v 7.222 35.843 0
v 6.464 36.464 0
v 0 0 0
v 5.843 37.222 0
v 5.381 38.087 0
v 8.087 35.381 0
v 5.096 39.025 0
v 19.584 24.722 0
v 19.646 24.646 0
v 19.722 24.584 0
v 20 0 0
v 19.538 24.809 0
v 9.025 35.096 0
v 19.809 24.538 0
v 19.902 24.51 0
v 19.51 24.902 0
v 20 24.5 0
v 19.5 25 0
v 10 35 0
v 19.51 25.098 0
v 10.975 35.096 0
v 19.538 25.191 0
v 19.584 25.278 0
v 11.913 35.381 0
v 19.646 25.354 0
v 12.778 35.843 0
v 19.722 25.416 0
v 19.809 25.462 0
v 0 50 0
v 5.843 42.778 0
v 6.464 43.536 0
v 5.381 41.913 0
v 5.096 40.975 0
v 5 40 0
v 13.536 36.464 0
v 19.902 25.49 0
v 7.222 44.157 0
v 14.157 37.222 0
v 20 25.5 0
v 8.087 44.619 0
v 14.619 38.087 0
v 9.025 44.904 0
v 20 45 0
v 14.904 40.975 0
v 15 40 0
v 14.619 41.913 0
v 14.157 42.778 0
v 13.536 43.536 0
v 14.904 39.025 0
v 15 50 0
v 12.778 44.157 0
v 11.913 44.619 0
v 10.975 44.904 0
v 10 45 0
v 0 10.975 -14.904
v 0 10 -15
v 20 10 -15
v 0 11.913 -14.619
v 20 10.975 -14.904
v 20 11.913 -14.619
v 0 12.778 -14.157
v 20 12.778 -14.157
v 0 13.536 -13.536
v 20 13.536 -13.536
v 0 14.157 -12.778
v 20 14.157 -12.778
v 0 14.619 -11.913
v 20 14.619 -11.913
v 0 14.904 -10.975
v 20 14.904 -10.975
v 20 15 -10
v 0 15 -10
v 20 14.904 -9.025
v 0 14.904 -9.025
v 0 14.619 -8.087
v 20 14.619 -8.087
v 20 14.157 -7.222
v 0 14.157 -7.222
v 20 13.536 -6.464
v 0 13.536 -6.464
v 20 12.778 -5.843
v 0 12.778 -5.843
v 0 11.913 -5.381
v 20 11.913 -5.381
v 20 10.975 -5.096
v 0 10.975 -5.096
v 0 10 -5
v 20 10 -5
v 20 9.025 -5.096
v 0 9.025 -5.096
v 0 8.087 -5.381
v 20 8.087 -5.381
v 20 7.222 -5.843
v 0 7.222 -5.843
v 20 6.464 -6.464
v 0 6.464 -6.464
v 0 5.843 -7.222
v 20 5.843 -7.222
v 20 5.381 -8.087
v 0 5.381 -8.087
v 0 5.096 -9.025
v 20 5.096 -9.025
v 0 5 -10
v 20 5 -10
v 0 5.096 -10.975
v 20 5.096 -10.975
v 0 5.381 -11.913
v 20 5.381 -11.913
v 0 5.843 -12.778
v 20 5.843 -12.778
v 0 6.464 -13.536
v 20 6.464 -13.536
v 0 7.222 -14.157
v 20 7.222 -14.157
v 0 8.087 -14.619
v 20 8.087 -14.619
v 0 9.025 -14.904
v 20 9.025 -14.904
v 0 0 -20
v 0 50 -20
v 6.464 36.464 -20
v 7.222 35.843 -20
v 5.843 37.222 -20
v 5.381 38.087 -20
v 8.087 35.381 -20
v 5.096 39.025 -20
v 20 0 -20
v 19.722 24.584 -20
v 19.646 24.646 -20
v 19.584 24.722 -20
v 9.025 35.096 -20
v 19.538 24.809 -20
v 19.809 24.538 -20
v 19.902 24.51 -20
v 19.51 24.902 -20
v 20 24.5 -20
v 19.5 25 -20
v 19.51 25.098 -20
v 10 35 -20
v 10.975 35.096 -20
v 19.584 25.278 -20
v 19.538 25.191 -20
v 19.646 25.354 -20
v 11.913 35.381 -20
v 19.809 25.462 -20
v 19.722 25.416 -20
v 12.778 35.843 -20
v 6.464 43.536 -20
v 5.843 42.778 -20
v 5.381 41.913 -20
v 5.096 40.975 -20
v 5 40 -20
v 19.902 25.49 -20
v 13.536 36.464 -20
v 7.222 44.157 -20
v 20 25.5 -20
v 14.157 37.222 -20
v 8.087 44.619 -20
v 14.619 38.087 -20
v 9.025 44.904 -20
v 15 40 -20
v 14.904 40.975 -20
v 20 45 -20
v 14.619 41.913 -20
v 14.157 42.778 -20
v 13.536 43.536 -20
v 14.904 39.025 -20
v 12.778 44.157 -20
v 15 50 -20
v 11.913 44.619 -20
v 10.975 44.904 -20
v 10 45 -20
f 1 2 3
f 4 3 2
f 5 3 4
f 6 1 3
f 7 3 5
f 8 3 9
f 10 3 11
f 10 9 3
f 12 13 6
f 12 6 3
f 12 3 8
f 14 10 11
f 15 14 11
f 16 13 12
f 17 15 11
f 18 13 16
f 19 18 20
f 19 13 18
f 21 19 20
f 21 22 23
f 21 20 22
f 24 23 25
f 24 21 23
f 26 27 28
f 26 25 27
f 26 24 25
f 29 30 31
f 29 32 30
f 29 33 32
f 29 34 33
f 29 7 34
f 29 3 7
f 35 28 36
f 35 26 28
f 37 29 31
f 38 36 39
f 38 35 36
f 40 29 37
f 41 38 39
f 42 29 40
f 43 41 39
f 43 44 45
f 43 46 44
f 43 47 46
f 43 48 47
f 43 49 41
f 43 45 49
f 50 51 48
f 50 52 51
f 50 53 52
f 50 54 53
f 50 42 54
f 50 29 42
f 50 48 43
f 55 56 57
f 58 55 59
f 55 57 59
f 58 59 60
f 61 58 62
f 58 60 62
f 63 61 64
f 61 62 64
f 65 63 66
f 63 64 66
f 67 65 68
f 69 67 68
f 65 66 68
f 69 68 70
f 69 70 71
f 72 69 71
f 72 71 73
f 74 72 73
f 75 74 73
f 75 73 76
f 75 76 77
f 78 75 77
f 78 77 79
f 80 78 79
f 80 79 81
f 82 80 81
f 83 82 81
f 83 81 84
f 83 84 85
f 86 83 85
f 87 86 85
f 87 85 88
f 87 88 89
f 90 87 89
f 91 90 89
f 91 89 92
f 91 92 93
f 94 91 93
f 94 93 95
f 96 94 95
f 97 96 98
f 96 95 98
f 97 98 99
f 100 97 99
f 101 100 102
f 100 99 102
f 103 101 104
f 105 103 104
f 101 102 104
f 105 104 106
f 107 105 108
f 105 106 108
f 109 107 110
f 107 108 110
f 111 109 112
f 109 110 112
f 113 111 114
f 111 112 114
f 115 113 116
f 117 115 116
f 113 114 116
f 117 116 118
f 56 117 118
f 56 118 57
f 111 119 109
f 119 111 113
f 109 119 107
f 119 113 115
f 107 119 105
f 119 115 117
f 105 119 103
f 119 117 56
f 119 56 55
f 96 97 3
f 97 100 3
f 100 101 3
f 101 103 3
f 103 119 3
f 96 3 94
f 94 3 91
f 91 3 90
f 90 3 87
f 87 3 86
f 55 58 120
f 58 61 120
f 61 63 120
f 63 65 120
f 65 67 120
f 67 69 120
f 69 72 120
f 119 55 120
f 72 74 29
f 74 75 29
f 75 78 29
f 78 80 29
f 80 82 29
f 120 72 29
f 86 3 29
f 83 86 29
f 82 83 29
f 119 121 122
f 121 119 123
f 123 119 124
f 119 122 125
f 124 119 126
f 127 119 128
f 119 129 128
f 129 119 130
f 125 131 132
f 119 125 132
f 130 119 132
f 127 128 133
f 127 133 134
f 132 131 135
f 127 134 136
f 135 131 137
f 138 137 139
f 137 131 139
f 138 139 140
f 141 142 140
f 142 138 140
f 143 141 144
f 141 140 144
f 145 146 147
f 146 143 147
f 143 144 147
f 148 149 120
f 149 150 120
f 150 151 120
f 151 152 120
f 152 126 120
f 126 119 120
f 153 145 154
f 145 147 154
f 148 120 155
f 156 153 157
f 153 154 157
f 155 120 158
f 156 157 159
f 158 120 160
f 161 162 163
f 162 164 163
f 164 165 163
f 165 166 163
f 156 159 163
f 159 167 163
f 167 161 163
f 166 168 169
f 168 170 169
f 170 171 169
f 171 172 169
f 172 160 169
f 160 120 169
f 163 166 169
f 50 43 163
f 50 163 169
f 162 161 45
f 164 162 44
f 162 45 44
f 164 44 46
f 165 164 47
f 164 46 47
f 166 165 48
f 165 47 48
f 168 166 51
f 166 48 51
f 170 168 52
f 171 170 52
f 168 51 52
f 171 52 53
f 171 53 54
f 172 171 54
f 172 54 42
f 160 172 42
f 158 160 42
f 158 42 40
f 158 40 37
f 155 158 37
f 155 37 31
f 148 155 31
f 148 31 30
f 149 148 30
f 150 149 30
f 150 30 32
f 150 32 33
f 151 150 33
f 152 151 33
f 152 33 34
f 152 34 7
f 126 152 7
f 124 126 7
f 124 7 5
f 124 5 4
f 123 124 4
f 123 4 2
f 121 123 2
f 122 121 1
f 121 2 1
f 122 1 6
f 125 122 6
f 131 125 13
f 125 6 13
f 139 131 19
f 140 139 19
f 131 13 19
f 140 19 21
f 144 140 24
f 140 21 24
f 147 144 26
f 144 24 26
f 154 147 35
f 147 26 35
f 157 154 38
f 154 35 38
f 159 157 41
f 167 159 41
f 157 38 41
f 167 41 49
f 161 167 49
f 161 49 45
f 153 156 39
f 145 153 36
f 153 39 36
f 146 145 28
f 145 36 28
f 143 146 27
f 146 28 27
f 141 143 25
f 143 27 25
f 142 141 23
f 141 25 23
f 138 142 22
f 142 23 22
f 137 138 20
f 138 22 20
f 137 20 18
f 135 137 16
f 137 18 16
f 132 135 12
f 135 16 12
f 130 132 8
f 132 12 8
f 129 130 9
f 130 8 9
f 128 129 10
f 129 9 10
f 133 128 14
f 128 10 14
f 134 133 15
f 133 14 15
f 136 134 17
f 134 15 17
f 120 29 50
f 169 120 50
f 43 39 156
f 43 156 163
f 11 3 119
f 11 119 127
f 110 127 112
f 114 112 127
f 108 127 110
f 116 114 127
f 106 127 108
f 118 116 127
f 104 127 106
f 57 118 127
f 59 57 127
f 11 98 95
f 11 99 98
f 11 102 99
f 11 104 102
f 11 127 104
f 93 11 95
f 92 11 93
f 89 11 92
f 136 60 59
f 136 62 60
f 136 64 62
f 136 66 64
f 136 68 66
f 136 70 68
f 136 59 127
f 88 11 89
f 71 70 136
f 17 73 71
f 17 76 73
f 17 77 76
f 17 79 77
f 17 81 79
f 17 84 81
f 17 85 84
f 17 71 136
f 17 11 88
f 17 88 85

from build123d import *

# Parameters (mm, degrees)
SKETCH1_W           = 20
SKETCH1_H           = 50
BOSS_EXTRUDE1_DEPTH = 20
CUT_EXTRUDE1_DEPTH  = 58.445626465
SKETCH3_R           = 5
CUT_EXTRUDE2_DEPTH  = 58.445626465
SKETCH4_R           = 5
CUT_EXTRUDE3_DEPTH  = 58.445626465
SKETCH5_R           = 0.5
CUT_EXTRUDE4_DEPTH  = 58.445626465


with BuildPart() as part:
    # Sketch1 → Boss-Extrude1 (new body)
    with BuildSketch(Plane.XY):
        with Locations((10, 25)):
            Rectangle(SKETCH1_W, SKETCH1_H)
    extrude(amount=-BOSS_EXTRUDE1_DEPTH)

    # Sketch2 → Cut-Extrude1 (cut, through all)
    with BuildSketch(Plane.XY):
        Polygon((20, 50), (20, 45), (15, 50), align=None)
    extrude(amount=-CUT_EXTRUDE1_DEPTH, mode=Mode.SUBTRACT)

    # Sketch3 → Cut-Extrude2 (cut, through all)
    with BuildSketch(Plane(origin=(20, 0, 0), x_dir=(0, 0, -1), z_dir=(1, 0, 0))):
        with Locations((10, 10)):
            Circle(SKETCH3_R)
    extrude(amount=-CUT_EXTRUDE2_DEPTH, mode=Mode.SUBTRACT)

    # Sketch4 → Cut-Extrude3 (cut, through all)
    with BuildSketch(Plane.XY):
        with Locations((10, 40)):
            Circle(SKETCH4_R)
    extrude(amount=-CUT_EXTRUDE3_DEPTH, mode=Mode.SUBTRACT)

    # Sketch5 → Cut-Extrude4 (cut, through all)
    with BuildSketch(Plane.XY):
        with Locations((20, 25)):
            Circle(SKETCH5_R)
    extrude(amount=-CUT_EXTRUDE4_DEPTH, mode=Mode.SUBTRACT)


solid = part.part
